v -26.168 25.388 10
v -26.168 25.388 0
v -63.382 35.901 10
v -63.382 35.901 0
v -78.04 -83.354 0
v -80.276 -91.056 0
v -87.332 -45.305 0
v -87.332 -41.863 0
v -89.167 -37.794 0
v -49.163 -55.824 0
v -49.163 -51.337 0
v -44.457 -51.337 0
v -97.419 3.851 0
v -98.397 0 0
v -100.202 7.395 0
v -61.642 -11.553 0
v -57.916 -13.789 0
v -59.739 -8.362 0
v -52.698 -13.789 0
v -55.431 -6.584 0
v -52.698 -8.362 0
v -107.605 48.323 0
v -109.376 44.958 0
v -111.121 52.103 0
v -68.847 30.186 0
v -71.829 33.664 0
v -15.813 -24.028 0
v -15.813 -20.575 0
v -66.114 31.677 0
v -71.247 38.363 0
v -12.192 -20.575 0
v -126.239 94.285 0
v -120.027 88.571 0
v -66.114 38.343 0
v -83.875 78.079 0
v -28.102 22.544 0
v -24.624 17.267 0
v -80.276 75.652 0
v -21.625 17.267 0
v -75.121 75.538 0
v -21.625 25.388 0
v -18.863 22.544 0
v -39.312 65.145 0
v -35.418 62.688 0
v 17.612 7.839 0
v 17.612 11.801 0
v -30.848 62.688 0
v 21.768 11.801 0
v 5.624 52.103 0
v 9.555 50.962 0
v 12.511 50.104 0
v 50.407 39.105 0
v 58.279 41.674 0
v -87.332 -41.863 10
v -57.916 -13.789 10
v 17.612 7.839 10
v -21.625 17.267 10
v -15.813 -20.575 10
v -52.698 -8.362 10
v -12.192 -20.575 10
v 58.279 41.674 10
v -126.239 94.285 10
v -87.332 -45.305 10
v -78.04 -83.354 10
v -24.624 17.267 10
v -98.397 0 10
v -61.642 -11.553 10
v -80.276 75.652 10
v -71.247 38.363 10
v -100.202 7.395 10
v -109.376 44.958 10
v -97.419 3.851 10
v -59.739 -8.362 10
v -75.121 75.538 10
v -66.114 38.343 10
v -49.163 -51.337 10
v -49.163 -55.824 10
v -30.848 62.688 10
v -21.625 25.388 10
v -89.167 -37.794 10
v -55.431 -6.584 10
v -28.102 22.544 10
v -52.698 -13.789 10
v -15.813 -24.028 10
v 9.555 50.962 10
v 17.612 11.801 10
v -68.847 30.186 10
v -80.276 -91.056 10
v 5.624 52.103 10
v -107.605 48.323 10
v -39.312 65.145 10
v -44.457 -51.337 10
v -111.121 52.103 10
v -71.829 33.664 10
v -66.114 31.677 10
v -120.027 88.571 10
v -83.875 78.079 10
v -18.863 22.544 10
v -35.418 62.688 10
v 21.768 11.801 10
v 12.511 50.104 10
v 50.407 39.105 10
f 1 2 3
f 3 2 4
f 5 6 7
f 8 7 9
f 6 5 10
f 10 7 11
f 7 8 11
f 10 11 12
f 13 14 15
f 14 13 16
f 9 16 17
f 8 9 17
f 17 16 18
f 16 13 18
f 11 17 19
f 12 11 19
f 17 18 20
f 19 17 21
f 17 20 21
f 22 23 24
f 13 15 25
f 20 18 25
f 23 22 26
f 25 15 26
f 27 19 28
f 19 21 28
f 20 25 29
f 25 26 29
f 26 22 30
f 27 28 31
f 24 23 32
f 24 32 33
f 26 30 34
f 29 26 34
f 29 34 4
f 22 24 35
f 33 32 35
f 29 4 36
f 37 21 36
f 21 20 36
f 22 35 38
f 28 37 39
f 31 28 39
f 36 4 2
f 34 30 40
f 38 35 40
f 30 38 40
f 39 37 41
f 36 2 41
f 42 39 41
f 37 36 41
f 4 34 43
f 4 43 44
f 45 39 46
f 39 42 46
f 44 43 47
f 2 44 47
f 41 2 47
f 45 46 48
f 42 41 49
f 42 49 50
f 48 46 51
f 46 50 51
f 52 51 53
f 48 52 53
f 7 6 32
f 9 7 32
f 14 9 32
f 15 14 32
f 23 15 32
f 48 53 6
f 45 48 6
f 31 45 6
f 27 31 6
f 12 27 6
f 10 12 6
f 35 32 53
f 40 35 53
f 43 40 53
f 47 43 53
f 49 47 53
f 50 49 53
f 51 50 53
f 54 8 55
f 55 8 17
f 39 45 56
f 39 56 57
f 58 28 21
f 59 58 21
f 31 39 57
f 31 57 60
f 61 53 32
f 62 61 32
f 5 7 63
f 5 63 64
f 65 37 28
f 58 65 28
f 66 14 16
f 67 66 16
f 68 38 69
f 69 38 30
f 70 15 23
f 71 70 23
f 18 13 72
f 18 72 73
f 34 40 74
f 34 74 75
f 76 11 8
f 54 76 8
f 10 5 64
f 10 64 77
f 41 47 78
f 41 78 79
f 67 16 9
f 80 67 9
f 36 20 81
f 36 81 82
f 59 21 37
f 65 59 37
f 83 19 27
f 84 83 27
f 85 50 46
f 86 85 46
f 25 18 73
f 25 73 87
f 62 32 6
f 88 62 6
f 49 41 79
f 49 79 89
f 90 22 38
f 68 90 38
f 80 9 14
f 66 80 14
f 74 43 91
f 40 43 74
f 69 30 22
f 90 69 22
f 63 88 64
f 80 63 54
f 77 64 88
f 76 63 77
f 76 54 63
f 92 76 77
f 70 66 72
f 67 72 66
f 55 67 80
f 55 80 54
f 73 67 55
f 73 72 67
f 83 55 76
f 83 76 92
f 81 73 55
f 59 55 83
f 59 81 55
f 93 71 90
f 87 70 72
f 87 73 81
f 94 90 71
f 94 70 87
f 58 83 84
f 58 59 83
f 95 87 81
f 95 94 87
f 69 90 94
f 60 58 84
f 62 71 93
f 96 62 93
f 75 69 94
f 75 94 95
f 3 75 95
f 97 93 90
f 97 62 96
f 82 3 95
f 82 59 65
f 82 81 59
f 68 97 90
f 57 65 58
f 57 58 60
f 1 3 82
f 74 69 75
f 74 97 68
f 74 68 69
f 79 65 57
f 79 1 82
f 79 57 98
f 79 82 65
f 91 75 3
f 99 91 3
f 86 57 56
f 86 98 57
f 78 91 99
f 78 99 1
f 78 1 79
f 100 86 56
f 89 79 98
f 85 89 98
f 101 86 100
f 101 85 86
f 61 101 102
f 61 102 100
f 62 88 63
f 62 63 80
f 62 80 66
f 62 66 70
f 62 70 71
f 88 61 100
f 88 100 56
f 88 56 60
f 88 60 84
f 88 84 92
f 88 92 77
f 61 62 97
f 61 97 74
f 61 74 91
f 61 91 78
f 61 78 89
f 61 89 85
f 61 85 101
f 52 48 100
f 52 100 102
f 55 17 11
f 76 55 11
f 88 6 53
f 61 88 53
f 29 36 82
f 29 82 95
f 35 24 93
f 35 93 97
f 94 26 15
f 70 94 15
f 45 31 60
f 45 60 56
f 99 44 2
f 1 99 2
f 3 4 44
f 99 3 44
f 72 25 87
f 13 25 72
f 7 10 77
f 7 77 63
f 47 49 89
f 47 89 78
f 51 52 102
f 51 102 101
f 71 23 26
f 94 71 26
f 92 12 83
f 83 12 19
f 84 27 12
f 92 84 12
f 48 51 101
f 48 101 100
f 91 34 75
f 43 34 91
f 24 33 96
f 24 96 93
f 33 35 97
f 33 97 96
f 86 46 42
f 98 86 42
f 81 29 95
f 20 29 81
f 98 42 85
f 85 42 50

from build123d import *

# Parameters (mm, degrees)
RESSALTO_EXTRUS_O1_DEPTH = 10


with BuildPart() as part:
    # Esboço1 → Ressalto-extrusão1 (new body)
    with BuildSketch(Plane.XY):
        Polygon((-126.238515457, 94.285443038), (-80.275914767, -91.055638665), (58.278900907, 41.674126668), align=None)
        Polygon((-120.027353202, 88.571173763), (-111.121083647, 52.102898426), (-83.875189284, 78.078561997), align=None, mode=Mode.SUBTRACT)
        Polygon((-78.039896355, -83.353797468), (-49.163405973, -55.823557892), (-87.332121667, -45.305158912), align=None, mode=Mode.SUBTRACT)
        Polygon((-107.605028691, 48.322842348), (-80.275914767, 75.651956272), (-71.247120871, 38.363415453), align=None, mode=Mode.SUBTRACT)
        Polygon((-75.120650095, 75.537691107), (-66.114464824, 38.342522964), (-39.312161848, 65.14482594), align=None, mode=Mode.SUBTRACT)
        Polygon((-109.376188137, 44.95811918), (-71.828734099, 33.664499425), (-100.202444106, 7.394622908), align=None, mode=Mode.SUBTRACT)
        Polygon((-30.847981962, 62.688227391), (-21.624691556, 25.38847633), (5.623637916, 52.102898426), align=None, mode=Mode.SUBTRACT)
        Polygon((-68.847376217, 30.186248562), (-97.418722592, 3.850920598), (-59.73906137, -8.361685457), align=None, mode=Mode.SUBTRACT)
        Polygon((-63.381553432, 35.900517837), (-35.418223954, 62.688227391), (-26.168285688, 25.38847633), align=None, mode=Mode.SUBTRACT)
        Polygon((-18.862754173, 22.543823465), (9.555234971, 50.961812609), (17.612002379, 11.801208285), align=None, mode=Mode.SUBTRACT)
        Polygon((12.511037677, 50.103936153), (21.768265533, 11.801208285), (50.407351595, 39.105111568), align=None, mode=Mode.SUBTRACT)
        Polygon((-98.396531864, 0), (-61.642428, -11.552761795), (-89.166567856, -37.793698777), align=None, mode=Mode.SUBTRACT)
        Polygon((-66.114464824, 31.676927503), (-55.431265745, -6.583831991), (-28.102151821, 22.543823465), align=None, mode=Mode.SUBTRACT)
        Polygon((-52.698354353, -8.361685457), (-24.623900958, 17.26703107), (-15.813359557, -20.575447504), align=None, mode=Mode.SUBTRACT)
        Polygon((-44.457092929, -51.33665786), (-52.698354353, -13.788780207), (-15.813359557, -24.02832393), align=None, mode=Mode.SUBTRACT)
        Polygon((-21.624691556, 17.26703107), (-12.191634703, -20.575447504), (17.612002379, 7.838714269), align=None, mode=Mode.SUBTRACT)
        Polygon((-57.915730647, -13.788780207), (-49.163405973, -51.33665786), (-87.332121667, -41.863233602), align=None, mode=Mode.SUBTRACT)
    extrude(amount=RESSALTO_EXTRUS_O1_DEPTH)


solid = part.part
